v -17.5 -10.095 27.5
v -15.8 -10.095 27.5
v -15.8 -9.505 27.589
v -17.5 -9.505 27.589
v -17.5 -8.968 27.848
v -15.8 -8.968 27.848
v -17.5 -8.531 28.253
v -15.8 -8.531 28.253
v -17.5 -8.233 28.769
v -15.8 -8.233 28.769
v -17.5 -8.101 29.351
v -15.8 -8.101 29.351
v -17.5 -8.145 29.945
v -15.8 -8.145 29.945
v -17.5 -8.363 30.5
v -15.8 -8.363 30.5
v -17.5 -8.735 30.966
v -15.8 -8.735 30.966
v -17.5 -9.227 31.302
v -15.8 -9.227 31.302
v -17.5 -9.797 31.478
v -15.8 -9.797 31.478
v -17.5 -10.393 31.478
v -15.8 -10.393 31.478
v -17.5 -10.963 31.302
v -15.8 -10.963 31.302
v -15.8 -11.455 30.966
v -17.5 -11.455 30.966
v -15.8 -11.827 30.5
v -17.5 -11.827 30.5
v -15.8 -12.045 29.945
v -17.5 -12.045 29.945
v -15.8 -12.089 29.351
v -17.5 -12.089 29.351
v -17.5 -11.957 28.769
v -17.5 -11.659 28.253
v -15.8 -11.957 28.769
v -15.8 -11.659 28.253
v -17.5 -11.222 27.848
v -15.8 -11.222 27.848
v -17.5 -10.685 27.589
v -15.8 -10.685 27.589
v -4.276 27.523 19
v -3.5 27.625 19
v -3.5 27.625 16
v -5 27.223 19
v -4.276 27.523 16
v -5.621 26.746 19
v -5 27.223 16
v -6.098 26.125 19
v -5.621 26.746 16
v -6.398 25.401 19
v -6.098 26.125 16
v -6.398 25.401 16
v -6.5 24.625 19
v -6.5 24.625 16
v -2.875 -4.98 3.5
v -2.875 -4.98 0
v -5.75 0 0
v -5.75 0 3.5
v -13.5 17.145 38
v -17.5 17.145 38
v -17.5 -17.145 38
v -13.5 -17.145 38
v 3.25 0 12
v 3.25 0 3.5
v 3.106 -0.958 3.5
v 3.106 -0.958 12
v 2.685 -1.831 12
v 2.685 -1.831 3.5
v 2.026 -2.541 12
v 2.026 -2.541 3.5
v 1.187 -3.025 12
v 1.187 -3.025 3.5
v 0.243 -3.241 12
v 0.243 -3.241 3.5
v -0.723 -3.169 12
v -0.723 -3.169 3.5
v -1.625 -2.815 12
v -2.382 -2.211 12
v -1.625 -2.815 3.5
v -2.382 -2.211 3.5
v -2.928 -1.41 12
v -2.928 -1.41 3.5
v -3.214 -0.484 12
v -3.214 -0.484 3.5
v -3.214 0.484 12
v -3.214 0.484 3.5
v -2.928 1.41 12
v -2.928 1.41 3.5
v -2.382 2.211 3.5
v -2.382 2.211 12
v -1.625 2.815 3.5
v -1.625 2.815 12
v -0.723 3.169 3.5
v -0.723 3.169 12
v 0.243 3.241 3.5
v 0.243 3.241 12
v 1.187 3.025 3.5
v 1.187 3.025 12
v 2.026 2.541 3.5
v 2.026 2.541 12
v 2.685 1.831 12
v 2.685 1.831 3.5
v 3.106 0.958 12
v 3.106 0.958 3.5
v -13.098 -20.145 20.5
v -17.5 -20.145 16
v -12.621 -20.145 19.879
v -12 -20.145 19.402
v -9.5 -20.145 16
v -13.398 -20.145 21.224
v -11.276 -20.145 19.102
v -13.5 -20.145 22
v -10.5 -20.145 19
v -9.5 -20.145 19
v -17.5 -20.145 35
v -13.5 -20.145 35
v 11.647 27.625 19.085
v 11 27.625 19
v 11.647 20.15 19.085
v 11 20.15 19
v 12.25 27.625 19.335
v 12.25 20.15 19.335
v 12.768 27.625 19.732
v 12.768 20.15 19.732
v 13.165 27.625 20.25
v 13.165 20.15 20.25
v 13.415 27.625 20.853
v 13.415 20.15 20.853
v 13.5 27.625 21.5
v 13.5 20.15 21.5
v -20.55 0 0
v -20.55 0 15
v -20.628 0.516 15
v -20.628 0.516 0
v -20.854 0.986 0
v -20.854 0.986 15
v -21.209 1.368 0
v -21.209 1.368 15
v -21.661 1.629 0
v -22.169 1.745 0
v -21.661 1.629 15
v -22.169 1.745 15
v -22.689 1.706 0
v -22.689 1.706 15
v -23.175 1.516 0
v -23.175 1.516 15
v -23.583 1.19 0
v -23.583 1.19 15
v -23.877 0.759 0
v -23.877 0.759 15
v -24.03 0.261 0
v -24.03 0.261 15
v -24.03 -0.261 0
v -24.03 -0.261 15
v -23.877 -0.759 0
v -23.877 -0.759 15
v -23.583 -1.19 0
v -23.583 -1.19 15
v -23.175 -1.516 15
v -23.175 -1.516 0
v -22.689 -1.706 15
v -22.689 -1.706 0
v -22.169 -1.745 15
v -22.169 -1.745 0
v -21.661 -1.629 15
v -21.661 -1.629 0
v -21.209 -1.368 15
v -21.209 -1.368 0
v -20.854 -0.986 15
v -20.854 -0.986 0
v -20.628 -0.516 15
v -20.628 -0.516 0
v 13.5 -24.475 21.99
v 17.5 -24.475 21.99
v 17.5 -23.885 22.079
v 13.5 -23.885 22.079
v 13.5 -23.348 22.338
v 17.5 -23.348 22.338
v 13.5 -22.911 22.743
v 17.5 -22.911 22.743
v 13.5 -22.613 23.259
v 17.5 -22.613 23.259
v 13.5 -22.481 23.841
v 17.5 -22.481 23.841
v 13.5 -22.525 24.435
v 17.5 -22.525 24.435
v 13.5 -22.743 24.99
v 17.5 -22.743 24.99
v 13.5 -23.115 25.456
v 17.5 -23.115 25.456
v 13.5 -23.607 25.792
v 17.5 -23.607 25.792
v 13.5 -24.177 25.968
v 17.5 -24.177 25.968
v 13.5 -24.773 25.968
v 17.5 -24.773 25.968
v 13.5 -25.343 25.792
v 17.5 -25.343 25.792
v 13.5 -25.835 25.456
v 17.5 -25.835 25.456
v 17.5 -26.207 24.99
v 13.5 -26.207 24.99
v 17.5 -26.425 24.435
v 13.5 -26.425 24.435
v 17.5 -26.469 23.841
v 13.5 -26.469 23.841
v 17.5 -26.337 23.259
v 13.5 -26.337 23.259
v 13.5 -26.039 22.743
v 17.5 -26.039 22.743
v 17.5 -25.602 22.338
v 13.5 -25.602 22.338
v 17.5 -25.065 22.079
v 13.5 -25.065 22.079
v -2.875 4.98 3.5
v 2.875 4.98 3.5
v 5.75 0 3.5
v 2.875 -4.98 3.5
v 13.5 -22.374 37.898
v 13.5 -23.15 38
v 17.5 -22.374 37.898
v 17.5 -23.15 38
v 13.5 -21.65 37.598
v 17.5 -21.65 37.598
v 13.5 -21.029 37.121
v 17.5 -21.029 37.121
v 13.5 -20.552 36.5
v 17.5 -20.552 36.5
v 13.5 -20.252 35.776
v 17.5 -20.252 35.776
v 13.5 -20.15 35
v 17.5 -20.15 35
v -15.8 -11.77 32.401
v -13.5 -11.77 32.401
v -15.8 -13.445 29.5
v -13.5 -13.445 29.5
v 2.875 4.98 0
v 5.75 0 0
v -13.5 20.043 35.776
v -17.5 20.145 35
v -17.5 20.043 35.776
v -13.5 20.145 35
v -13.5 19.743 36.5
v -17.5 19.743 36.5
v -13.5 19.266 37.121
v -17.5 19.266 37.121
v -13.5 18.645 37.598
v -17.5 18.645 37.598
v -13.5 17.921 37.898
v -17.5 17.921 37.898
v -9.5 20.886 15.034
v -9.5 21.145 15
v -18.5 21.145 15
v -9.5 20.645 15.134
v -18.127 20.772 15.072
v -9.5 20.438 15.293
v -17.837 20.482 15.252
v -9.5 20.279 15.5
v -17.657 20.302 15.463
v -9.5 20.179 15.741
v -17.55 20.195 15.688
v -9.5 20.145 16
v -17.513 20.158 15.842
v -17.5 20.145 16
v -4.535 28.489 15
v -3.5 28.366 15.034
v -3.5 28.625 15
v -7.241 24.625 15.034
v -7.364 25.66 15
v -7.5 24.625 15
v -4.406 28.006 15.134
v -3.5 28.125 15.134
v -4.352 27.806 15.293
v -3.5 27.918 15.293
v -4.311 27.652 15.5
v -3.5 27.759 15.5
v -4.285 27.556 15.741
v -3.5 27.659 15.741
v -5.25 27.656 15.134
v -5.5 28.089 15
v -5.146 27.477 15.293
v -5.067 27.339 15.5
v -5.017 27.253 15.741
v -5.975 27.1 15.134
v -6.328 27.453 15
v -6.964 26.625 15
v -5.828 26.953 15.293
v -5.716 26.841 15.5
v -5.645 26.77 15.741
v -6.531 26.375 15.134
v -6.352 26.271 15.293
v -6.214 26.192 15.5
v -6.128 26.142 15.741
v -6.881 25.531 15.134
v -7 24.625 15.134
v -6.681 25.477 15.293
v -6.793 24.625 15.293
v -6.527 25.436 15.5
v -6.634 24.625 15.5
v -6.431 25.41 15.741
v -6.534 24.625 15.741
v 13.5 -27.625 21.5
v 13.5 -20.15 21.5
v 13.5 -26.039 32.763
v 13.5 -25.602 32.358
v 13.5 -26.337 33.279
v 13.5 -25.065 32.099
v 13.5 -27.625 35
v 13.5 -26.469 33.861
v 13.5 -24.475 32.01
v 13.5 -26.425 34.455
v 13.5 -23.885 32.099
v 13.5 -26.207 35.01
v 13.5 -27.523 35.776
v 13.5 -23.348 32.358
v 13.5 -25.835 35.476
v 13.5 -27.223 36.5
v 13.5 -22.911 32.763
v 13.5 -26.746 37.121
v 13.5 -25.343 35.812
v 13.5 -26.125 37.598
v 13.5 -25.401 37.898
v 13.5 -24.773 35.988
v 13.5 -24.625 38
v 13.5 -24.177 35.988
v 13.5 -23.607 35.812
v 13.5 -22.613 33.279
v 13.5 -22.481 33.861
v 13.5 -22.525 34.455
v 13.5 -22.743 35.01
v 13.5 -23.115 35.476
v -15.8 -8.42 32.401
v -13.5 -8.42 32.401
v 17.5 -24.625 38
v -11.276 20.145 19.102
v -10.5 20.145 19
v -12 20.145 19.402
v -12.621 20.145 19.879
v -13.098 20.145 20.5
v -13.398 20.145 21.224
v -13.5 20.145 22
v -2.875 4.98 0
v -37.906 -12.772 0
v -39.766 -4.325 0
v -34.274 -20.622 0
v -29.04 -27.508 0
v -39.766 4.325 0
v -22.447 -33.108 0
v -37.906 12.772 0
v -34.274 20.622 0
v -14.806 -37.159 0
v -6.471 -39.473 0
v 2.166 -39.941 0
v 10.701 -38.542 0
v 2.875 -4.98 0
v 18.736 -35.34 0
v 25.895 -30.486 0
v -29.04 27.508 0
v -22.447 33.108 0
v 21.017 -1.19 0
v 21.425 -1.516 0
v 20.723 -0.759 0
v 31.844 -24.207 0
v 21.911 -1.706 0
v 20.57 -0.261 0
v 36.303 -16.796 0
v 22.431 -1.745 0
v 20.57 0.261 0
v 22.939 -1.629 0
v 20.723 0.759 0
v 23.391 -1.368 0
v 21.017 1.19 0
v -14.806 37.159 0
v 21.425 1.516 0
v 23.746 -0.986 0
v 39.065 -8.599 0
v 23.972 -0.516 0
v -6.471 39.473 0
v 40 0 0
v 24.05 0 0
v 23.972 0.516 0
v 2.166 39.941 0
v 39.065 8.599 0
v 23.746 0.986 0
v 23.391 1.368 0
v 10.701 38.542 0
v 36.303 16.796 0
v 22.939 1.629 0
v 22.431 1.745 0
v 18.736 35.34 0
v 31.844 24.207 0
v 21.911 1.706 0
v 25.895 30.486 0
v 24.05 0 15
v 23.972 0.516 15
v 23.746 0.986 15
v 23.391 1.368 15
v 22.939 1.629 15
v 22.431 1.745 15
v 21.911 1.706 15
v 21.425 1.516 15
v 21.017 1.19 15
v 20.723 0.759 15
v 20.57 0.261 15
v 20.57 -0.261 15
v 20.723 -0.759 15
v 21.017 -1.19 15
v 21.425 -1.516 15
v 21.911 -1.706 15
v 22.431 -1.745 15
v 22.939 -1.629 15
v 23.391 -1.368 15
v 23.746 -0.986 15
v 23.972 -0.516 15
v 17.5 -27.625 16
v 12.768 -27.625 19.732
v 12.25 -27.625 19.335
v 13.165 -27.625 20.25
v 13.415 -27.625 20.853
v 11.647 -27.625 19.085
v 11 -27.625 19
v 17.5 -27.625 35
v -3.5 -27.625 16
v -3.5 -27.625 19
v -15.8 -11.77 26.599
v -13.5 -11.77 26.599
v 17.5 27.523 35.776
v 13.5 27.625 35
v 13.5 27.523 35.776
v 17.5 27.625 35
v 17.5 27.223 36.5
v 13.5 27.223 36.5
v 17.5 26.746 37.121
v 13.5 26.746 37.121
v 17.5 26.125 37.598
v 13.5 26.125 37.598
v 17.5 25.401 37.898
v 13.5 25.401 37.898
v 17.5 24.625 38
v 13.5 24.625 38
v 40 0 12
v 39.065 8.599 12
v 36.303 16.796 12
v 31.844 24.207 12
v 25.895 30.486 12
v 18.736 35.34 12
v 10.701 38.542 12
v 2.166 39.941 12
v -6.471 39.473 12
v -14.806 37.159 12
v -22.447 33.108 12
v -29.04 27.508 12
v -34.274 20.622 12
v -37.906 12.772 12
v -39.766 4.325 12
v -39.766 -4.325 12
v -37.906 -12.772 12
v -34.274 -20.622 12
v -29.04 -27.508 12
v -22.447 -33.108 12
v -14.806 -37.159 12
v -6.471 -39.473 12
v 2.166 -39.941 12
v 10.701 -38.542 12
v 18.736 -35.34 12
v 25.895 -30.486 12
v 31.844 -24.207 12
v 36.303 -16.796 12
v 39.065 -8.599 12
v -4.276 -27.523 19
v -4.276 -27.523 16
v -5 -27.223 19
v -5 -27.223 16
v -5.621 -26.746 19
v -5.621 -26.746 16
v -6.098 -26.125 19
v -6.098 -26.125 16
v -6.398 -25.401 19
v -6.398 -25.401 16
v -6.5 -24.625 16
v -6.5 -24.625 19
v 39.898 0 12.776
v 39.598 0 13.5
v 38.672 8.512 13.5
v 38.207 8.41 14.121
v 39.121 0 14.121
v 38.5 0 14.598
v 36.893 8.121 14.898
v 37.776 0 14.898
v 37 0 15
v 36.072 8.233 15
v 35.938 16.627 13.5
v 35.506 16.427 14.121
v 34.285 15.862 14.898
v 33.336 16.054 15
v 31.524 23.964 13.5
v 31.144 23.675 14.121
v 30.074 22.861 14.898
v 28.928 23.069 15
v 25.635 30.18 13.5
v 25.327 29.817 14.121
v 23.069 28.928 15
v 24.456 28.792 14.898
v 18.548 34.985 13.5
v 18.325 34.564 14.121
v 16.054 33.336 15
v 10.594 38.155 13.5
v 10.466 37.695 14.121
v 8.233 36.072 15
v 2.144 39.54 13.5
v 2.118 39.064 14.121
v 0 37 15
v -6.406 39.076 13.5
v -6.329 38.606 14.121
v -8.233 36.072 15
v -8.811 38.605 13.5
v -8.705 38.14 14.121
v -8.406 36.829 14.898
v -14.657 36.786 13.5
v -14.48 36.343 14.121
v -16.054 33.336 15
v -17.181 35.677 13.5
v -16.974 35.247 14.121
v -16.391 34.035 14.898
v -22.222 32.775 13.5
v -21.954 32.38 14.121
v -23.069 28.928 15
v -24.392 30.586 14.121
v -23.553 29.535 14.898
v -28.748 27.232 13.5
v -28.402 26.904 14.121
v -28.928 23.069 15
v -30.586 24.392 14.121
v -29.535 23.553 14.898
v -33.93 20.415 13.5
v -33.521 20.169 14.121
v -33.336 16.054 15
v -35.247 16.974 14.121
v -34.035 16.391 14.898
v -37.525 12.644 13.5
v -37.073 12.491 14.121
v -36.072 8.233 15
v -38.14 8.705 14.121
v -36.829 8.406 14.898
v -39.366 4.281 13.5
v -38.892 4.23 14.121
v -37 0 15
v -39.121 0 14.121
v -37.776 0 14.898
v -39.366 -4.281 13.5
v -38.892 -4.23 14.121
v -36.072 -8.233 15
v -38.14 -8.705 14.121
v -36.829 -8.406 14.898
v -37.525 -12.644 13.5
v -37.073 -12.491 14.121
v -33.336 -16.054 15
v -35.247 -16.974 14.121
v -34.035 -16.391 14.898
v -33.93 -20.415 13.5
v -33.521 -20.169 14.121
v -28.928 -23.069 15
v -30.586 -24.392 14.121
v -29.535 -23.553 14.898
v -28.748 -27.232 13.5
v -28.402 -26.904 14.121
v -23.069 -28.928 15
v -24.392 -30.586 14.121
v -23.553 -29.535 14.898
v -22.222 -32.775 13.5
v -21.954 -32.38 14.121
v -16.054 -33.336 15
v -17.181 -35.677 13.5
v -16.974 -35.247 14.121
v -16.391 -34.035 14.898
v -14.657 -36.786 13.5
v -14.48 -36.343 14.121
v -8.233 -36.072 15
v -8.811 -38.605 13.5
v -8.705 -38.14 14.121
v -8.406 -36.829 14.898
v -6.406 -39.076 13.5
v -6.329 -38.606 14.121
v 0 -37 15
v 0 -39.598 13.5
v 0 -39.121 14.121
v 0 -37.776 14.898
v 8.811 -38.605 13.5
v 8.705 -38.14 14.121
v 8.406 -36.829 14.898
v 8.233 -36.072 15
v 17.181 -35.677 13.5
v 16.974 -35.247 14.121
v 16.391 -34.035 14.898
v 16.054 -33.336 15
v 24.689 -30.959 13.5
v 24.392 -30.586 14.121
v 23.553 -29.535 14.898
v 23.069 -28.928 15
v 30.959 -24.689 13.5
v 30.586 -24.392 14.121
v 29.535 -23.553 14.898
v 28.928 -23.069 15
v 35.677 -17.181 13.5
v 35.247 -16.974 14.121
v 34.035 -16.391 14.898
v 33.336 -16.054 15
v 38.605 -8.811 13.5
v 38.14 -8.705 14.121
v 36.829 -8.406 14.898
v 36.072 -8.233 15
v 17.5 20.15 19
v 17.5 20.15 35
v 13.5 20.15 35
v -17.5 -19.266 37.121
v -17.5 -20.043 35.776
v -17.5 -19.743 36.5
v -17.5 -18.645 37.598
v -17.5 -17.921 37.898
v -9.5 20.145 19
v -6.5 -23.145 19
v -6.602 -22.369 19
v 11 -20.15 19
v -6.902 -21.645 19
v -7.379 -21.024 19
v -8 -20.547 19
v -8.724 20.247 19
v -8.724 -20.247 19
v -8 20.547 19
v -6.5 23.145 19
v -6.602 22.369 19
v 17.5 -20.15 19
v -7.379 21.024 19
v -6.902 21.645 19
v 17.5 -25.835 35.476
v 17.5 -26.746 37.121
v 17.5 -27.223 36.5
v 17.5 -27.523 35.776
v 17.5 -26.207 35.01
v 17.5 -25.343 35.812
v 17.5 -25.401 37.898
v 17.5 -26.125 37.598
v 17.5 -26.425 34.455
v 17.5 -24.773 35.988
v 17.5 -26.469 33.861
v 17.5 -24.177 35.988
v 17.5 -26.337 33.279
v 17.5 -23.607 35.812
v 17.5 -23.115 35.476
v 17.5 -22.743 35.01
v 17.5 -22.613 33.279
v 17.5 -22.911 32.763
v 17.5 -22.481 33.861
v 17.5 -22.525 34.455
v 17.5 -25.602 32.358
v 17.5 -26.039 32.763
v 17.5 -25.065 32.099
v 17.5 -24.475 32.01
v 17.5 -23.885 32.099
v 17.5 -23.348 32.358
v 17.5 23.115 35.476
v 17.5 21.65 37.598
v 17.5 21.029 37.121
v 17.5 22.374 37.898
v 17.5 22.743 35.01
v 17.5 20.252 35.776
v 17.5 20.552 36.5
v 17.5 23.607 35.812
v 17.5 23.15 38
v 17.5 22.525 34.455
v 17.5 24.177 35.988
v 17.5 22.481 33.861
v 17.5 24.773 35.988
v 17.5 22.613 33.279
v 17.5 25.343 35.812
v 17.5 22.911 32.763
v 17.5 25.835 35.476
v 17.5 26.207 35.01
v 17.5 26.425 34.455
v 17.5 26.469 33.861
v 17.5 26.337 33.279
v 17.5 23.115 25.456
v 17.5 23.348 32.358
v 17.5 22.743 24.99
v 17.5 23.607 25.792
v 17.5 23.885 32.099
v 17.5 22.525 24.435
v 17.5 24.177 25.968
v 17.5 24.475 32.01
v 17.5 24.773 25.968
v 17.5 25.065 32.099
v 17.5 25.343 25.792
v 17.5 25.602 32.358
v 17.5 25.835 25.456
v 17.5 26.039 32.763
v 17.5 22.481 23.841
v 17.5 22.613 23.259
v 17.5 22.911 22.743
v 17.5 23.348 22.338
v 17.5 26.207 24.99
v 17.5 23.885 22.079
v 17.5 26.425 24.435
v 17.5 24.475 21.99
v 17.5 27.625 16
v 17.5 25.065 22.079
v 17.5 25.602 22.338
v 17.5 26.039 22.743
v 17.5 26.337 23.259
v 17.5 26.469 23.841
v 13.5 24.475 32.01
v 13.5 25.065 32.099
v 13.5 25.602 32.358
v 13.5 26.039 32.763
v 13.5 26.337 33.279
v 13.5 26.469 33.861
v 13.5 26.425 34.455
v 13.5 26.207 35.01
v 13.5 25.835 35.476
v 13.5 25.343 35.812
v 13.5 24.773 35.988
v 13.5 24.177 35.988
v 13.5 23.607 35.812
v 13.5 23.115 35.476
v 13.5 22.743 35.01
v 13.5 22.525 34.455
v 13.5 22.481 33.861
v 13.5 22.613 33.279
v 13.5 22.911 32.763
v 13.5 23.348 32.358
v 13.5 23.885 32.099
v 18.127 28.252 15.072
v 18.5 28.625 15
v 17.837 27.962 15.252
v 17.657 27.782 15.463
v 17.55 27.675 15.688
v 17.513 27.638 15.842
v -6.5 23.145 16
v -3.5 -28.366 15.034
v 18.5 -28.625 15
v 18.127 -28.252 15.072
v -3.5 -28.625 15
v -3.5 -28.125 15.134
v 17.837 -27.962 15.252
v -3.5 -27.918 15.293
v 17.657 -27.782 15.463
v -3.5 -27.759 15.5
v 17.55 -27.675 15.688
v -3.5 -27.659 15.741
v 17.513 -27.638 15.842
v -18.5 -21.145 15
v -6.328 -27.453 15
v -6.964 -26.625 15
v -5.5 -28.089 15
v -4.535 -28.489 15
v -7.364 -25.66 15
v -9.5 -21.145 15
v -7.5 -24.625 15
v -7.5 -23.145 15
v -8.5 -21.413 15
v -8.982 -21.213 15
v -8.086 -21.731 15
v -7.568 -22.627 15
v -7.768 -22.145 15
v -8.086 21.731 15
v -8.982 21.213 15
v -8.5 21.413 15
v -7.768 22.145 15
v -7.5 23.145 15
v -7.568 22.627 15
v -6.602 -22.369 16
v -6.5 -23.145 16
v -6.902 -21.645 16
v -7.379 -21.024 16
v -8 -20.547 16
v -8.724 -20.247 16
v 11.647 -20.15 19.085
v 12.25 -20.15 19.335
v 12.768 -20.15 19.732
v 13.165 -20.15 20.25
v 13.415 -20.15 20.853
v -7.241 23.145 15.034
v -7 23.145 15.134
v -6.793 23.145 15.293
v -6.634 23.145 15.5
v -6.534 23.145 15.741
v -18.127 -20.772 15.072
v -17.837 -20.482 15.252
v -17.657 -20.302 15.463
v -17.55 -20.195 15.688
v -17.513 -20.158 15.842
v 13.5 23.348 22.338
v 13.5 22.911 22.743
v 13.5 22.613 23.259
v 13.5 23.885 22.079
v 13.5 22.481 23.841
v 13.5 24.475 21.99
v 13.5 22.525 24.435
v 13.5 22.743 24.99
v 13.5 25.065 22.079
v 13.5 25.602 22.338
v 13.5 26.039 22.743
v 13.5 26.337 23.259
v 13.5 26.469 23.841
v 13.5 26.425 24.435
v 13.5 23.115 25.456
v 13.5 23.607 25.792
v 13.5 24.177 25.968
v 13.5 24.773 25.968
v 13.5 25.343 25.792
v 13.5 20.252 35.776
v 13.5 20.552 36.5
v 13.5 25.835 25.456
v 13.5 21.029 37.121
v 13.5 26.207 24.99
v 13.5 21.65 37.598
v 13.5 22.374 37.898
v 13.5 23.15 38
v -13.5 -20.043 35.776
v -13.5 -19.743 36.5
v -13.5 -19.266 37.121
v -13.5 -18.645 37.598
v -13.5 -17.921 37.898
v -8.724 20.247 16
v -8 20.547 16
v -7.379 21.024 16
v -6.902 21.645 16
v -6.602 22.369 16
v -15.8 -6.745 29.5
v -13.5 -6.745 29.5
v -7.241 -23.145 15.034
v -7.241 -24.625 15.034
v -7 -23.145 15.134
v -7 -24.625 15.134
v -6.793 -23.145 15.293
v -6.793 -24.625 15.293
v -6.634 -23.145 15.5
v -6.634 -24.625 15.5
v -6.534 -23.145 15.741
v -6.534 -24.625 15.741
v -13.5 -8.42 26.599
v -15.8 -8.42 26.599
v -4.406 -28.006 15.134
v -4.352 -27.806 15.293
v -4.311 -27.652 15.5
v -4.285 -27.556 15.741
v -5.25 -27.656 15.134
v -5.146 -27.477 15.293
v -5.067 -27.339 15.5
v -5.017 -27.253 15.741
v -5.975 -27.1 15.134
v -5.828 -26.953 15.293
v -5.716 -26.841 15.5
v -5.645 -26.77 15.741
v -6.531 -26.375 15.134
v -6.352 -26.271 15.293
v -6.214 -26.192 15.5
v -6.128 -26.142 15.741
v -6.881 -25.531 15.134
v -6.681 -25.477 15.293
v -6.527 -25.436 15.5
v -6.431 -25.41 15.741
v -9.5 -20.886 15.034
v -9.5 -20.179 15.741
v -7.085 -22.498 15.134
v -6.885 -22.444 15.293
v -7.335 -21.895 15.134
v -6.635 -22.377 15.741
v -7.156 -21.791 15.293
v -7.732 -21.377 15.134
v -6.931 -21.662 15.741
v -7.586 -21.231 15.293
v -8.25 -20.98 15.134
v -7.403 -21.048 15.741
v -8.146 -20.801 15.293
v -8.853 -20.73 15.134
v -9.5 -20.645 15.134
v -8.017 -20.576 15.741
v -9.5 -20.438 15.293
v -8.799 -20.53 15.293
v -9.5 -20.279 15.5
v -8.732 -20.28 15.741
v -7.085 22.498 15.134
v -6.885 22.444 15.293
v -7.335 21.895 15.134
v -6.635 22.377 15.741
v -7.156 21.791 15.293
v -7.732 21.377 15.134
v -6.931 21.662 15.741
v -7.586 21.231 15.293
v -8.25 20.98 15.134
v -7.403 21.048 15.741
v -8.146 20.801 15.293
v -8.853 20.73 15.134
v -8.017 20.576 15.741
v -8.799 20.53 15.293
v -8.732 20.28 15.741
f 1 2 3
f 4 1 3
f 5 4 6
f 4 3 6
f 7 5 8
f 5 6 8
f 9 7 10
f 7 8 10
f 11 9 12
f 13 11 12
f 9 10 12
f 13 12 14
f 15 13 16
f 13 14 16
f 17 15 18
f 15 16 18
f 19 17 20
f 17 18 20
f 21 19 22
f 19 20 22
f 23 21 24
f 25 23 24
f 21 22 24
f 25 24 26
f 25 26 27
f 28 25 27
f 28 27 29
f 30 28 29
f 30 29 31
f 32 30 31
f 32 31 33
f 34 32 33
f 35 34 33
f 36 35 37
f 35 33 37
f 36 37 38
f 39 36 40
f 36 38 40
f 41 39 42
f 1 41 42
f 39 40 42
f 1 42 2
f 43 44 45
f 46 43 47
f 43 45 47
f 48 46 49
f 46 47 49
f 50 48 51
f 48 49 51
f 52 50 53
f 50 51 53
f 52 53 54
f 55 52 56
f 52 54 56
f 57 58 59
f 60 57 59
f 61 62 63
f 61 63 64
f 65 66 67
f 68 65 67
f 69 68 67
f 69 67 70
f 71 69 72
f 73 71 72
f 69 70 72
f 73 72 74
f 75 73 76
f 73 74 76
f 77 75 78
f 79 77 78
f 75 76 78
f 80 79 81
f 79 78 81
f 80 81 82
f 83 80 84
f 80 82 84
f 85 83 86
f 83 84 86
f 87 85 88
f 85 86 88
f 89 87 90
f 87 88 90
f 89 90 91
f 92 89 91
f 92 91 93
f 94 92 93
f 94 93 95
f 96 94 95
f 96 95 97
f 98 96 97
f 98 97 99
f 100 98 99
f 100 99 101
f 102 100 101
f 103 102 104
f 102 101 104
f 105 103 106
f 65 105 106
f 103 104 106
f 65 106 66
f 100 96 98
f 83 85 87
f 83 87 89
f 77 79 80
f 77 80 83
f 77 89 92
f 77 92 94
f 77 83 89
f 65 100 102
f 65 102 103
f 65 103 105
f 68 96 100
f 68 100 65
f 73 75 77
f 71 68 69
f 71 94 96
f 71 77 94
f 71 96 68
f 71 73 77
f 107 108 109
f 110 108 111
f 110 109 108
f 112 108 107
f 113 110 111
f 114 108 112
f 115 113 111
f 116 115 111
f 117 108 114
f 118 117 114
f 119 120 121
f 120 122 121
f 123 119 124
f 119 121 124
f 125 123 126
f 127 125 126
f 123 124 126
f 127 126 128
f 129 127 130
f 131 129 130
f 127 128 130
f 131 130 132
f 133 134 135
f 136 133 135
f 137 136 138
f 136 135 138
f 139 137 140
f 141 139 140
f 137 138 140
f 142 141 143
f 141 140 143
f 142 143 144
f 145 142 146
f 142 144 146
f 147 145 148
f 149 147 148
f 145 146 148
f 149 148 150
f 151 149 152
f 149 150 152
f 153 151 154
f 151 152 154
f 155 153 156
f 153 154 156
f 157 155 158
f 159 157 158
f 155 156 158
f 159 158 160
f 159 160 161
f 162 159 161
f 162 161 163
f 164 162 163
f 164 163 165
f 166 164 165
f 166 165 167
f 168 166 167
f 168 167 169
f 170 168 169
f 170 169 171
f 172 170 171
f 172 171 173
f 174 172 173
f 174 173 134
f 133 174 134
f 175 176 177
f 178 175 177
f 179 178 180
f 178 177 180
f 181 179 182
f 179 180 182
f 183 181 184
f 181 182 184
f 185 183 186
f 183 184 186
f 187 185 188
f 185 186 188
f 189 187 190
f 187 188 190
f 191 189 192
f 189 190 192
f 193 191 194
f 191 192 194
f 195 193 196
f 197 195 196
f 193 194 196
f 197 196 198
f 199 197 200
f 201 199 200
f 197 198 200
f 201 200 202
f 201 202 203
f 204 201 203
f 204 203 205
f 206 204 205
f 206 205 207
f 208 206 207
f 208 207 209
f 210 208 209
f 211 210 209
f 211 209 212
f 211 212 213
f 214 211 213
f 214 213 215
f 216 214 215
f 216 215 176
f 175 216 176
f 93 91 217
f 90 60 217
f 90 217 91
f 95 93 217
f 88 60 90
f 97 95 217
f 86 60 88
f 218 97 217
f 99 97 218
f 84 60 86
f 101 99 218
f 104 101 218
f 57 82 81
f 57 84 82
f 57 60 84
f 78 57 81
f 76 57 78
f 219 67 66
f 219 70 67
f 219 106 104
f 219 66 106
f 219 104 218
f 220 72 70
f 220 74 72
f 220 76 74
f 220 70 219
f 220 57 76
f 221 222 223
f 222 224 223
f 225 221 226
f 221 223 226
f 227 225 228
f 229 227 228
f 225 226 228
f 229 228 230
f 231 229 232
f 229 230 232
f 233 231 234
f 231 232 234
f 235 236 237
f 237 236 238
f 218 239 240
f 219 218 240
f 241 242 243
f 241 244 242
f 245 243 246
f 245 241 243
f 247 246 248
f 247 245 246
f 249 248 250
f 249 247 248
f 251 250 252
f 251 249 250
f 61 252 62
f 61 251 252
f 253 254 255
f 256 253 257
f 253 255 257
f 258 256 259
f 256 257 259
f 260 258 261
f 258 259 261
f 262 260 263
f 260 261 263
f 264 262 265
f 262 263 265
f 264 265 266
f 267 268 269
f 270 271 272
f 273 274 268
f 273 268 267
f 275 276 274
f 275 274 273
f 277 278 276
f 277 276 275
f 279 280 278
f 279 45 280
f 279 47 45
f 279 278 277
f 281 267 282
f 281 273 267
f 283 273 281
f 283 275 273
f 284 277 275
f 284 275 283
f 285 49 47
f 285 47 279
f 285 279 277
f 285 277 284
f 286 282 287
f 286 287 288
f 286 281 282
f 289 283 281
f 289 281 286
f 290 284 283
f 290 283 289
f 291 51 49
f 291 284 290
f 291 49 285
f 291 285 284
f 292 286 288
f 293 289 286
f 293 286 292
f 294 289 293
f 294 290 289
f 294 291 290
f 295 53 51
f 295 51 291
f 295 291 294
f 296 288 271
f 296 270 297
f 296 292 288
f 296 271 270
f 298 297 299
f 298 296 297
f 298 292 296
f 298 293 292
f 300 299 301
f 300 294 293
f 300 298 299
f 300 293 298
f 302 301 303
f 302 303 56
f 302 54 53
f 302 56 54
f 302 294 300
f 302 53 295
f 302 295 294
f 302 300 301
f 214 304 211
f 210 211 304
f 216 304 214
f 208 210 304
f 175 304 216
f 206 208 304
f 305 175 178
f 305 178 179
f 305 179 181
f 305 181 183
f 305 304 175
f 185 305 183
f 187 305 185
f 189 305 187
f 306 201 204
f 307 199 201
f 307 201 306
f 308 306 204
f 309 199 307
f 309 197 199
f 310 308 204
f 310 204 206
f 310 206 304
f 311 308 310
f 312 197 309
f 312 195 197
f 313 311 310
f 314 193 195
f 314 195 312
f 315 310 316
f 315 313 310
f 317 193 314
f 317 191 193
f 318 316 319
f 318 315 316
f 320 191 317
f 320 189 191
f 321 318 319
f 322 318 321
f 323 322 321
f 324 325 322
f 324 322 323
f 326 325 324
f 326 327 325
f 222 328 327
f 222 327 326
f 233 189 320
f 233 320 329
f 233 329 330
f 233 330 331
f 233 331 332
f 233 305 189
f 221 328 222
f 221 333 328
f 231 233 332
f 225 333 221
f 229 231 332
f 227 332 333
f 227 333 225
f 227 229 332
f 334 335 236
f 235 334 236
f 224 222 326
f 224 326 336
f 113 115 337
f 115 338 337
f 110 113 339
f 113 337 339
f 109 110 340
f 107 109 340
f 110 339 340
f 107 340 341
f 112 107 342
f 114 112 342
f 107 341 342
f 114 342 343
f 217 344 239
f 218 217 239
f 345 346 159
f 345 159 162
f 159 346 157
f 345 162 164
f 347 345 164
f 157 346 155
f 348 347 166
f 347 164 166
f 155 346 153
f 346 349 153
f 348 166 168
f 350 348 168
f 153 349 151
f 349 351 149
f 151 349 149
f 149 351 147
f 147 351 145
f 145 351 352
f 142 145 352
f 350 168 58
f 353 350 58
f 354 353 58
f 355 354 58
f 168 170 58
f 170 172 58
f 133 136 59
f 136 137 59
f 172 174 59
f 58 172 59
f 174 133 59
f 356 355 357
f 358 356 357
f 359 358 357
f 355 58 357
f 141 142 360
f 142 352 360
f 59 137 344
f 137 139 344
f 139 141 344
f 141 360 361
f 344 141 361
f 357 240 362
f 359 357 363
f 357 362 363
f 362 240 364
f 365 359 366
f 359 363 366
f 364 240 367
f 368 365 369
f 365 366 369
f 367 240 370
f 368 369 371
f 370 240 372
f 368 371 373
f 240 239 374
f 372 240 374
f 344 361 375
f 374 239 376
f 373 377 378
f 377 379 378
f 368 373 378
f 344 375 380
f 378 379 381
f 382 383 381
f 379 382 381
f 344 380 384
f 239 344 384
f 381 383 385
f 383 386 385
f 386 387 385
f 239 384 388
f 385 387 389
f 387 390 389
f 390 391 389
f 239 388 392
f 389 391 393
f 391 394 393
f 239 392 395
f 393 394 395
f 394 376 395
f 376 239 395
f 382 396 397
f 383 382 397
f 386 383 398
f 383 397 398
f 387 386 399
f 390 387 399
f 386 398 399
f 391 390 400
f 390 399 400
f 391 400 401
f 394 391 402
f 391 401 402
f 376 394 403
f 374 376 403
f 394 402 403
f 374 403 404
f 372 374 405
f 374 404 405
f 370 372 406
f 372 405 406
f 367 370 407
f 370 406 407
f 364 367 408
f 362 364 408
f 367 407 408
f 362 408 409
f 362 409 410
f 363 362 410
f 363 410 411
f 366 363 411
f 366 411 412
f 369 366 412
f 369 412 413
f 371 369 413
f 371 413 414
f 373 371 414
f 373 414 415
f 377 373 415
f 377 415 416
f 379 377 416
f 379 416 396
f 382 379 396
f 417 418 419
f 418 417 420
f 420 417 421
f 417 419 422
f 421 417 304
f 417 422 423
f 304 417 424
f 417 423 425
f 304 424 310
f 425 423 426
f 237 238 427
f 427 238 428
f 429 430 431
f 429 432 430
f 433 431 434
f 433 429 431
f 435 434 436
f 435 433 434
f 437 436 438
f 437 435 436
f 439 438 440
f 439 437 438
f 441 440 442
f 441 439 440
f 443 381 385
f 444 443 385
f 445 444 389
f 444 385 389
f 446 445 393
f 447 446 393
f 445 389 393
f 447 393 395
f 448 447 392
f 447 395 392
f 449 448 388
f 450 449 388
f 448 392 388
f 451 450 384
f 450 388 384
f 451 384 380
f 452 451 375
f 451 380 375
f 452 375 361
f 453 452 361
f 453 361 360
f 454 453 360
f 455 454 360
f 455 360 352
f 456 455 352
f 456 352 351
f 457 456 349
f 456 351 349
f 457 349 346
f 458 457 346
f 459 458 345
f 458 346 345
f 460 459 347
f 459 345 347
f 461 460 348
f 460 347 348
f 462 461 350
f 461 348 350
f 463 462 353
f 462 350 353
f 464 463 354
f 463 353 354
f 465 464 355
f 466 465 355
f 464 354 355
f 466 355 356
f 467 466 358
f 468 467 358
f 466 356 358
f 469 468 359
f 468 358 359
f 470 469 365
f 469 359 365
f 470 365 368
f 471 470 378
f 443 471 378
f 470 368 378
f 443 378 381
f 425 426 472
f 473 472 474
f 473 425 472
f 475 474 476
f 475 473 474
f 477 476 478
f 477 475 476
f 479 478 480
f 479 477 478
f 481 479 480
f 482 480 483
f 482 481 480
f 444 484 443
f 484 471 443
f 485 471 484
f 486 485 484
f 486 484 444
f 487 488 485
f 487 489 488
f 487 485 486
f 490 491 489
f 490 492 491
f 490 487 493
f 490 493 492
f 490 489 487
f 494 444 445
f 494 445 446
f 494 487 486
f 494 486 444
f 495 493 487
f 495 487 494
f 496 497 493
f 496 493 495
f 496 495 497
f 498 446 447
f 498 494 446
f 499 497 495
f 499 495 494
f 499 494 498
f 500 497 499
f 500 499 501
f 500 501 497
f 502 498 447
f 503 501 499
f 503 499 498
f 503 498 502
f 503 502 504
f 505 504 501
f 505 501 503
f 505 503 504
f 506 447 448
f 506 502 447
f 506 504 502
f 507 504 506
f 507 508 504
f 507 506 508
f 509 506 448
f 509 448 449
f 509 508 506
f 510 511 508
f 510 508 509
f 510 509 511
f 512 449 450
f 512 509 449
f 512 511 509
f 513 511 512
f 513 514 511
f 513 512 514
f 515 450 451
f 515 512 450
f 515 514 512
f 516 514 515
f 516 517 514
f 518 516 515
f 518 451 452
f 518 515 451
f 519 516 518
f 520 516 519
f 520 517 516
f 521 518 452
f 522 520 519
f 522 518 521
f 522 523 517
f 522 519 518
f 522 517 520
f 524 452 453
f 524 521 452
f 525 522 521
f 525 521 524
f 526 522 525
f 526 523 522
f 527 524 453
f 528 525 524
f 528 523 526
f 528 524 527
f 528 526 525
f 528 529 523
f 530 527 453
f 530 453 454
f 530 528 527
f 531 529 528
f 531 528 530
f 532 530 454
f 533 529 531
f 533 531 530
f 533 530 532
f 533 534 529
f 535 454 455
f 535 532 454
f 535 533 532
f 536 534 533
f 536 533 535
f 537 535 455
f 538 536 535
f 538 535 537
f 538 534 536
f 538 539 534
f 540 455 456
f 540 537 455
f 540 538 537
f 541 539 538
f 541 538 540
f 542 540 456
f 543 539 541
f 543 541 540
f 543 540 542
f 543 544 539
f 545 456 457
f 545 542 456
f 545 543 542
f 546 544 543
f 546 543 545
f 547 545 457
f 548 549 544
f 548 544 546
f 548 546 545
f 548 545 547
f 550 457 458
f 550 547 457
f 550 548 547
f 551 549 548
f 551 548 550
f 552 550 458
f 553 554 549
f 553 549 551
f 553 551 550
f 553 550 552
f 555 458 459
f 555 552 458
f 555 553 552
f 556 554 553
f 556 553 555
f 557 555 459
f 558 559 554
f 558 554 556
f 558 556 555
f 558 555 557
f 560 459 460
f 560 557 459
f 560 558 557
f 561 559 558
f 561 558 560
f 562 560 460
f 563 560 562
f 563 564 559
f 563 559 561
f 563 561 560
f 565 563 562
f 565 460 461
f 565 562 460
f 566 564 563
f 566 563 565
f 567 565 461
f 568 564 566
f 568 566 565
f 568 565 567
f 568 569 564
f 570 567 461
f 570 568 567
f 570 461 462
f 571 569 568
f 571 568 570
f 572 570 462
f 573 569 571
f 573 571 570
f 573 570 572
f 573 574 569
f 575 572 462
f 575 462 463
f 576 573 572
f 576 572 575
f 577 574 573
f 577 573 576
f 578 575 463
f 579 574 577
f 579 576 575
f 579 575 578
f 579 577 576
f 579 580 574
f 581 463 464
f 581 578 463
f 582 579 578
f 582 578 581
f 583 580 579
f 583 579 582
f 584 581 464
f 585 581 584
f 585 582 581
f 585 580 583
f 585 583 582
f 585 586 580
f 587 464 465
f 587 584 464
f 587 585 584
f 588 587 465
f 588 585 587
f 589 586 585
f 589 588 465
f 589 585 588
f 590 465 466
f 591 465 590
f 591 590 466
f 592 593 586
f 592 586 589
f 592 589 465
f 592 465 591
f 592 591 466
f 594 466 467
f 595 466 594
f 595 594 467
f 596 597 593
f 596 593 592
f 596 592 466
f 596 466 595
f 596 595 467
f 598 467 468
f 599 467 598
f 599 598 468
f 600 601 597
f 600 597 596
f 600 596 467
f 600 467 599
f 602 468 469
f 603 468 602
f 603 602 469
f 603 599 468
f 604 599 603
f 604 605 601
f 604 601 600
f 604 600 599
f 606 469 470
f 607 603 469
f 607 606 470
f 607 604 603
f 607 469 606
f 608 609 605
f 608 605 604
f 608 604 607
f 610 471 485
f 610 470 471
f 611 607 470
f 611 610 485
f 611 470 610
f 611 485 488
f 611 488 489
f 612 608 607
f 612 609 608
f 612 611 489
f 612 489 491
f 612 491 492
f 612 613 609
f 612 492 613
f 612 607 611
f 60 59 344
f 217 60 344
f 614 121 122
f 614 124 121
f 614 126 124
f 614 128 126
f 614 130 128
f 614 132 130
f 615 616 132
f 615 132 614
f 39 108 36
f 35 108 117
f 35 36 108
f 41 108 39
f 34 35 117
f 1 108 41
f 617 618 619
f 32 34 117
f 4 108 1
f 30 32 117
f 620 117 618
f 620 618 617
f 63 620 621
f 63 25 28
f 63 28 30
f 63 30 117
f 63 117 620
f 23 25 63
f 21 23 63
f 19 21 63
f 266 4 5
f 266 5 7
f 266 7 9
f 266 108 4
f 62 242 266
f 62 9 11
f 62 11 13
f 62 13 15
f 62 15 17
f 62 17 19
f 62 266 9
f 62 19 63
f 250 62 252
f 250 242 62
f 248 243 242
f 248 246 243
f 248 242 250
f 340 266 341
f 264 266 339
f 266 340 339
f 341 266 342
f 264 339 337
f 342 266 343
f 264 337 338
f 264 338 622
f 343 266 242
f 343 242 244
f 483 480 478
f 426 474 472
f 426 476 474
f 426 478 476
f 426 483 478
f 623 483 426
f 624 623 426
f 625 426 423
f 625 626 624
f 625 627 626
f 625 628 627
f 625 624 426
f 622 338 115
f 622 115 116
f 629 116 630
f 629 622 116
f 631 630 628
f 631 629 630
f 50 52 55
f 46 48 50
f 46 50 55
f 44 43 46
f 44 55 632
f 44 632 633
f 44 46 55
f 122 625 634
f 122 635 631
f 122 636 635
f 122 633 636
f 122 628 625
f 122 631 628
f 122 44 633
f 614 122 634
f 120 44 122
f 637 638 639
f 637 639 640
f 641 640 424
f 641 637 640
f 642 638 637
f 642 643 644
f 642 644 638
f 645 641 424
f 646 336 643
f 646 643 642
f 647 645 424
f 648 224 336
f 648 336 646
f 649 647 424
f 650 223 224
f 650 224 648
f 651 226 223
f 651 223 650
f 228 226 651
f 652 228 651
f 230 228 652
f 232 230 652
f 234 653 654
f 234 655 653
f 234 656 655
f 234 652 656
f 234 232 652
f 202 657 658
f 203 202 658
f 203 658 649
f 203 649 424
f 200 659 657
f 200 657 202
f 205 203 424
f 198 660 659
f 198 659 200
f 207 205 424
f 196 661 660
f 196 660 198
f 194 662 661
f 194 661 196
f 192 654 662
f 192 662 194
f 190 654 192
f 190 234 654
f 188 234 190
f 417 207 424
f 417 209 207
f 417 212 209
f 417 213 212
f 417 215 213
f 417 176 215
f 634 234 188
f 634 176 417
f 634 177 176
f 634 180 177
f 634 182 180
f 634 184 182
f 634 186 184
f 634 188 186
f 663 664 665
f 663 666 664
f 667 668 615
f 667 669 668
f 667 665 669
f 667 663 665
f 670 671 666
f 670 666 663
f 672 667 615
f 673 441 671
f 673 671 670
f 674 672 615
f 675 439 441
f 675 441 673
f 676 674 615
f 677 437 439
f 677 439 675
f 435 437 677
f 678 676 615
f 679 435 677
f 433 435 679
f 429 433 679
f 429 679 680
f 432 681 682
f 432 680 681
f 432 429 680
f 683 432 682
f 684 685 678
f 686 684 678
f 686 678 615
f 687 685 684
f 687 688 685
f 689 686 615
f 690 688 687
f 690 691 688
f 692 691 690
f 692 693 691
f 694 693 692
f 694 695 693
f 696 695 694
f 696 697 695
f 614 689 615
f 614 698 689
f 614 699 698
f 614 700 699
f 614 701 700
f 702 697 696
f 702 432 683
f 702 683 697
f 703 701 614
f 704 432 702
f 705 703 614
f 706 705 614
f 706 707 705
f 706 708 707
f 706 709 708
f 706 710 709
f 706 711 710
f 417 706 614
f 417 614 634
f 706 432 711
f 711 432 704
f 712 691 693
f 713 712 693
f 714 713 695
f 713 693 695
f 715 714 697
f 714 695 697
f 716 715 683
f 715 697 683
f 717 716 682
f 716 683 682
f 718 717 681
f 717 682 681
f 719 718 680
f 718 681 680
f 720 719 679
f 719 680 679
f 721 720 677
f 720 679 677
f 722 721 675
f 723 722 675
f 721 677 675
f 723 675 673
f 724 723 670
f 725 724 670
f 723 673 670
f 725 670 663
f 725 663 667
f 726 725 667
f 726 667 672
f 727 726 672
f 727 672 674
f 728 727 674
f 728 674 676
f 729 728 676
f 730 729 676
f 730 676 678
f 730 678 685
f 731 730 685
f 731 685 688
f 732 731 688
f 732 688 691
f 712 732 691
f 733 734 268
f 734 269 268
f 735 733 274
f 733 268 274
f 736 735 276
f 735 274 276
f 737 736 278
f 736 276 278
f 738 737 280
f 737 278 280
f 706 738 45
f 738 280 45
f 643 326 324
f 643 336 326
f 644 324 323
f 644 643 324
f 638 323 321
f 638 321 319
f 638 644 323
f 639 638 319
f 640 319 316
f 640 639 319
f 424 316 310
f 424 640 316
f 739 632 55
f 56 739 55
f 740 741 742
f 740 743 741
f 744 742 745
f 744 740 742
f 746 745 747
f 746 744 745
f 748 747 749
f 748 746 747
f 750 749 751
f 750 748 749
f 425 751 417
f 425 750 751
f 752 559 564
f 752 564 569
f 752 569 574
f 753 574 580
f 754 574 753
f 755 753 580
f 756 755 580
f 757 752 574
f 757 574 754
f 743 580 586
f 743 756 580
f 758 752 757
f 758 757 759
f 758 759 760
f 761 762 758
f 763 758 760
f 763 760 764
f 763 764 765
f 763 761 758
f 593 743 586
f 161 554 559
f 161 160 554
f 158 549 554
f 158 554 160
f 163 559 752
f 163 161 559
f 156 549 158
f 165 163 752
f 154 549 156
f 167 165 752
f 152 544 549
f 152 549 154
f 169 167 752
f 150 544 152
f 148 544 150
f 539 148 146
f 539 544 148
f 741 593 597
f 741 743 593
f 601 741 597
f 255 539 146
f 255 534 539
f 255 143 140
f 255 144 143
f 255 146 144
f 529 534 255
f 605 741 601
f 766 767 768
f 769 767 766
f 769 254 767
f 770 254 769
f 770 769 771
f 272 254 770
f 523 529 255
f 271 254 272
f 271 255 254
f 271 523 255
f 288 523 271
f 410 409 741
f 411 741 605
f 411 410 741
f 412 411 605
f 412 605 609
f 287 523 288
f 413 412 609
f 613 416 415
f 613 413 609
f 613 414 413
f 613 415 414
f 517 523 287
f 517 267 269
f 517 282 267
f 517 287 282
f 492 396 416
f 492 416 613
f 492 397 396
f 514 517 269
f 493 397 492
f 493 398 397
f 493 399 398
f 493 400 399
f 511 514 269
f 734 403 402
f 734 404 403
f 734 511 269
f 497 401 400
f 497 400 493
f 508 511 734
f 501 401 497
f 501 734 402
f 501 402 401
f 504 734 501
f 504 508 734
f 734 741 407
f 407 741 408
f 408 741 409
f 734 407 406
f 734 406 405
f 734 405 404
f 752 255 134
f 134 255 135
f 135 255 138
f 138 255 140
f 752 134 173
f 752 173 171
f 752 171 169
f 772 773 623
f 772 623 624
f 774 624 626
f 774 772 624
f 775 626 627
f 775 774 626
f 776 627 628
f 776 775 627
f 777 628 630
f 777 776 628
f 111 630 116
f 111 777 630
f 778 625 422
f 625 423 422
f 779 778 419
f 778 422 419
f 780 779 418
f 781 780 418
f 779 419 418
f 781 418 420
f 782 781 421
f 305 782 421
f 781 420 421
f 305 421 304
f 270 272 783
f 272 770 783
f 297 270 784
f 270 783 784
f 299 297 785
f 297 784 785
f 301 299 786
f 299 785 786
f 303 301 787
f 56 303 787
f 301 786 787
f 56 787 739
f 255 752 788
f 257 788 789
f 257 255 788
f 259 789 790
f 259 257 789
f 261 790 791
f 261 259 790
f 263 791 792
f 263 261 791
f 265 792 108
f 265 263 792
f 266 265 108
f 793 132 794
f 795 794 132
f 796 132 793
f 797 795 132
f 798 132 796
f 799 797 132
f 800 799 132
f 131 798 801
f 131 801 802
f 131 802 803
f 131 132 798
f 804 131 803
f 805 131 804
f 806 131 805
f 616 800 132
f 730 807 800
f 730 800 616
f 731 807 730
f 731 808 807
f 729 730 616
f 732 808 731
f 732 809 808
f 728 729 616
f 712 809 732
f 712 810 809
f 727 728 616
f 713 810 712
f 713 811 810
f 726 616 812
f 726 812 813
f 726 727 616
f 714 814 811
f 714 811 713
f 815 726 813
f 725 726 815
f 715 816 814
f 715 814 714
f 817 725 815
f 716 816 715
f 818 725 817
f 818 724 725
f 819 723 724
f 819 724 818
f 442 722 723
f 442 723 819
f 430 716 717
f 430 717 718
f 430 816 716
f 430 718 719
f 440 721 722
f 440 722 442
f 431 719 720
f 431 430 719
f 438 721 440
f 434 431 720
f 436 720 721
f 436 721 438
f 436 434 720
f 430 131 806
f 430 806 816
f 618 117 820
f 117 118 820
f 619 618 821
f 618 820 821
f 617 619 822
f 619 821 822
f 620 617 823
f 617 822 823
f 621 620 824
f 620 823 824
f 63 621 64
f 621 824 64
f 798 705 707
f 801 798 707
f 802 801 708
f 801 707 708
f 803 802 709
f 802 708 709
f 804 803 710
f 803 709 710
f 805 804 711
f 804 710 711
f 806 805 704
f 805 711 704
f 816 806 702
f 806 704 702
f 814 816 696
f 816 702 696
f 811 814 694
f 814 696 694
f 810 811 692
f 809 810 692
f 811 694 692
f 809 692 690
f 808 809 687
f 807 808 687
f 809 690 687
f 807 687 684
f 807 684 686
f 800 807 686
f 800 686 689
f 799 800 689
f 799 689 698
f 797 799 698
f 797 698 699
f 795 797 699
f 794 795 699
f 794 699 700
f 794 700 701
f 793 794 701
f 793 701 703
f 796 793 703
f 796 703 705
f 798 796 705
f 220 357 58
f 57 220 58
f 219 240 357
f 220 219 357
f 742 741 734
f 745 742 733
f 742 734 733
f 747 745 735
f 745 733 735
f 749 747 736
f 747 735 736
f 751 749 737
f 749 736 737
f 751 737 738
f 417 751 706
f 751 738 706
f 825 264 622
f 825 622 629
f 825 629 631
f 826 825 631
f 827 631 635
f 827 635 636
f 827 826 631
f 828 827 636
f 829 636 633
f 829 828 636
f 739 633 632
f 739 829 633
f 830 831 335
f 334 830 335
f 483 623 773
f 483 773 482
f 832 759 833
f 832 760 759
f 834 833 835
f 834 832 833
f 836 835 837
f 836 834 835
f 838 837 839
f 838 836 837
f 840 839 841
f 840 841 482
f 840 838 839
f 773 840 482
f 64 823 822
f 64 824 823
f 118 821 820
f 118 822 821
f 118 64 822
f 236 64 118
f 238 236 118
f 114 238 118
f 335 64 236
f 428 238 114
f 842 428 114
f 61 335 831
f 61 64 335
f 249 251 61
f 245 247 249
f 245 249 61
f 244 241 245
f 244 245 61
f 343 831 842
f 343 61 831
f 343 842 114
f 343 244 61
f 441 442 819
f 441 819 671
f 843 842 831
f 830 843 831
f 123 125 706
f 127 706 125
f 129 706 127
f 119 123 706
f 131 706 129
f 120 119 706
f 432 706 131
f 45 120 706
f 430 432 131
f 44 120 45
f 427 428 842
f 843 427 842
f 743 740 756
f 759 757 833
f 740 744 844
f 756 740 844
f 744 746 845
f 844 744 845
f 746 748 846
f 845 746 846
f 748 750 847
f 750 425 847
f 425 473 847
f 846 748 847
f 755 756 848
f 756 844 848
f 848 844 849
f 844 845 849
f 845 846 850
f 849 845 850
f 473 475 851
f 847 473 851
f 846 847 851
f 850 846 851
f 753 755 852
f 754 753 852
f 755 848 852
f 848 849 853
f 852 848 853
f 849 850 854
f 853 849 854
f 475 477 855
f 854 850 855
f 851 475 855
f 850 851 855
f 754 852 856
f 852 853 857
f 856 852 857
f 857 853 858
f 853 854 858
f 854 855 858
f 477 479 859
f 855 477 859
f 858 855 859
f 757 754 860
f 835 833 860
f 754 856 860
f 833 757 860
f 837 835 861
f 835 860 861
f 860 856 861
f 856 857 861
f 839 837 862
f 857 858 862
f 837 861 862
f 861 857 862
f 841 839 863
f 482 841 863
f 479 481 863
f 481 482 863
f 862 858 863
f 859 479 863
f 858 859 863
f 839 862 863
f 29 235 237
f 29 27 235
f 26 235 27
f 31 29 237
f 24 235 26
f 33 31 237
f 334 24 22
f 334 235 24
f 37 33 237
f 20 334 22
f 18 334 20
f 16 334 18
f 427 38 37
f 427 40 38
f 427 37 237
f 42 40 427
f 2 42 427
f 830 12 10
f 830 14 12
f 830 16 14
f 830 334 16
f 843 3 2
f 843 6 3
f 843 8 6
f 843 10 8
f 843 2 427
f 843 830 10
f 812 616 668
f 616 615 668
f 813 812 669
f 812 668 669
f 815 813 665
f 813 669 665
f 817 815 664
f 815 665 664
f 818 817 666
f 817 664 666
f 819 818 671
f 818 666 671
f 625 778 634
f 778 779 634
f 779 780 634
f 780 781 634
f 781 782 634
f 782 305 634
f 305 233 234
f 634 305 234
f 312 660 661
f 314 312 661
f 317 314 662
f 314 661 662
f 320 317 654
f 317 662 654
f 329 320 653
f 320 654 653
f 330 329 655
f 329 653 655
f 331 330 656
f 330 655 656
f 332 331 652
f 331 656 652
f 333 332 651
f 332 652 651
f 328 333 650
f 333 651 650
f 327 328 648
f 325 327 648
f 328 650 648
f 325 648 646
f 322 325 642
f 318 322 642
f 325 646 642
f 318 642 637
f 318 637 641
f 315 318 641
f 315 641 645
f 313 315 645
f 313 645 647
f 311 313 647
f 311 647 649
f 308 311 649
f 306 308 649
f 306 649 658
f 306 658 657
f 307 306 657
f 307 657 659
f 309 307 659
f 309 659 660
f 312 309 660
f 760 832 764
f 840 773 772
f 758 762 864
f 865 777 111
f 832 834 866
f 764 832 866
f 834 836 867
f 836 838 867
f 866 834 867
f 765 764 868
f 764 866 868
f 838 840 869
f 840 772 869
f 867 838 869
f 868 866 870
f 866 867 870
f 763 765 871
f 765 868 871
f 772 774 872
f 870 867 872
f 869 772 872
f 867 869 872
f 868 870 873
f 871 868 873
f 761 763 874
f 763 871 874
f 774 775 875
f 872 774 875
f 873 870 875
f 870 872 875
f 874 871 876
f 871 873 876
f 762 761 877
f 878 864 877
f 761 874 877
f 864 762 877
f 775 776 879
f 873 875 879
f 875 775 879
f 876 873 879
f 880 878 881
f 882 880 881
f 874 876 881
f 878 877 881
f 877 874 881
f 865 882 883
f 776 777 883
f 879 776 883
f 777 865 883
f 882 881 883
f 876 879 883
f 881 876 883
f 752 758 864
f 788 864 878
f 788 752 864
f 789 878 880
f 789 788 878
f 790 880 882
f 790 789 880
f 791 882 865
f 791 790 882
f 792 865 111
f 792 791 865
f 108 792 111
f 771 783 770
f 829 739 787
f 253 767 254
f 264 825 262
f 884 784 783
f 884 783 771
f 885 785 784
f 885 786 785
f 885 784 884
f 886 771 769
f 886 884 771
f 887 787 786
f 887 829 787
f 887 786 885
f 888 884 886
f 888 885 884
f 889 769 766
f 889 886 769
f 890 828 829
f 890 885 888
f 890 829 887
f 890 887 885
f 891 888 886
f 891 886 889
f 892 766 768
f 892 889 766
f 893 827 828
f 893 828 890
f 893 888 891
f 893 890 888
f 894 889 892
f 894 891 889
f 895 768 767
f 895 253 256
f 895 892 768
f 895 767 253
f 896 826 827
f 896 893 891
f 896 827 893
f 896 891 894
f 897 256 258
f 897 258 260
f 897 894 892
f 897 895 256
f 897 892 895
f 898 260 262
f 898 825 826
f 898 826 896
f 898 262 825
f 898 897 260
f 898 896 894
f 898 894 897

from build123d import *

# Parameters (mm, degrees)
PAD001_DEPTH            = 27.625
SKETCH006_W             = 4
SKETCH006_H             = 40.3
POCKET003_DEPTH         = 19
SKETCH007_W             = 11
SKETCH007_H             = 7.48
POCKET004_DEPTH         = 161.659754
SKETCH008_R             = 2
POCKET005_DEPTH         = 5
POCKET006_DEPTH         = 2.3
SKETCH010_R             = 2
POCKET007_DEPTH         = 1.7
FILLET001_R             = 3
FILLET002_R             = 2.5
BODY001_PLACEMENT_ANGLE = 90
SKETCH_R                = 40
PAD_DEPTH               = 15
POCKET_DEPTH            = 3.5
SKETCH002_R             = 3.25
POCKET001_DEPTH         = 8.5
SKETCH003_R             = 1.75
POCKET002_DEPTH         = 15.001
FILLET_R                = 3
FILLET003_R             = 1


with BuildPart() as body001:
    # Sketch005 → Pad001 (new body, symmetric)
    with BuildSketch(Plane.YZ):
        Polygon((-17.5, 23), (-17.5, 0), (17.5, 0), (17.5, 23), (13.5, 23), (13.5, 4), (-13.5, 4), (-13.5, 23), align=None)
    extrude(amount=PAD001_DEPTH, both=True)

    # Sketch006 (on Face8 of Pad001) → Pocket003 (cut)
    with BuildSketch(Plane(origin=(0, 0, 23), x_dir=(0, -1, 0), z_dir=(0, 0, 1))):
        with Locations((15.5, 0)):
            Rectangle(SKETCH006_W, SKETCH006_H)
    extrude(amount=-POCKET003_DEPTH, mode=Mode.SUBTRACT)

    # Sketch007 (on Face11 of Pocket003) → Pocket004 (cut, through all)
    with BuildSketch(Plane(origin=(0, 0, 23), x_dir=(0, -1, 0), z_dir=(0, 0, 1))):
        with Locations((-12, 23.885)):
            Rectangle(SKETCH007_W, SKETCH007_H)
    pocket004 = extrude(amount=-POCKET004_DEPTH, mode=Mode.SUBTRACT)

    # Mirrored: Pocket004 across YZ
    add(pocket004.mirror(Plane.YZ), mode=Mode.SUBTRACT)

    # Sketch008 (on Face1 of Mirrored) → Pocket005 (cut)
    with BuildSketch(Plane(origin=(0, -17.5, 0), x_dir=(0, 0, -1), z_dir=(0, -1, 0))):
        with Locations((-19.01, -24.475)):
            Circle(SKETCH008_R)
        with Locations((-8.99, -24.475)):
            Circle(SKETCH008_R)
        with Locations((-8.99, 24.475)):
            Circle(SKETCH008_R)
        with Locations((-19.01, 24.475)):
            Circle(SKETCH008_R)
    extrude(amount=-POCKET005_DEPTH, mode=Mode.SUBTRACT)

    # Sketch009 (on Face22 of Pocket005) → Pocket006 (cut)
    with BuildSketch(Plane(origin=(0, 13.5, 0), x_dir=(0, 0, -1), z_dir=(0, -1, 0))):
        Polygon((-11.598815, -11.77), (-11.598815, -8.42), (-14.5, -6.745), (-17.401185, -8.42), (-17.401185, -11.77), (-14.5, -13.445), align=None)
    extrude(amount=-POCKET006_DEPTH, mode=Mode.SUBTRACT)

    # Sketch010 (on Face30 of Pocket006) → Pocket007 (cut)
    with BuildSketch(Plane(origin=(0, 15.8, 0), x_dir=(0, 0, -1), z_dir=(0, -1, 0))):
        with Locations((-14.5, -10.095)):
            Circle(SKETCH010_R)
    extrude(amount=-POCKET007_DEPTH, mode=Mode.SUBTRACT)

    # Fillet001
    fillet001_edges = [body001.edges().sort_by_distance(p)[0] for p in [
        (-20.15, -15.5, 23),
        (-27.625, -15.5, 23),
        (20.15, -15.5, 23),
        (27.625, -15.5, 23),
        (20.145, 15.5, 23),
        (27.625, 6.5, 2),
        (-20.145, 15.5, 23),
        (-27.625, 6.5, 2),
        (-20.145, 6.5, 2),
        (20.145, 6.5, 2),
        (0, 13.5, 4),
    ]]
    fillet(fillet001_edges, radius=FILLET001_R)

    # Fillet002
    fillet002_edges = [body001.edges().sort_by_distance(p)[0] for p in [
        (-23.8875, -13.5, 4),
        (23.8875, -13.5, 4),
    ]]
    fillet(fillet002_edges, radius=FILLET002_R)


with BuildPart() as body001_1:
    # Body001 placement: moved
    add(body001.part.moved(Location((0, 0, 15))).rotate(Axis((0, 0, 15), (0, 0, 1)), BODY001_PLACEMENT_ANGLE))


with BuildPart() as body:
    # Sketch → Pad (new body)
    with BuildSketch(Plane.XY):
        Circle(SKETCH_R)
    extrude(amount=PAD_DEPTH)

    # Sketch001 (on Face2 of Pad) → Pocket (cut)
    with BuildSketch(Plane(origin=(0, 0, 0), x_dir=(1, 0, 0), z_dir=(0, 0, -1))):
        Polygon((2.875, -4.979646), (5.75, 0), (2.875, 4.979646), (-2.875, 4.979646), (-5.75, 0), (-2.875, -4.979646), align=None)
    extrude(amount=-POCKET_DEPTH, mode=Mode.SUBTRACT)

    # Sketch002 (on Face10 of Pocket) → Pocket001 (cut)
    with BuildSketch(Plane(origin=(0, 0, 3.5), x_dir=(1, 0, 0), z_dir=(0, 0, -1))):
        Circle(SKETCH002_R)
    extrude(amount=-POCKET001_DEPTH, mode=Mode.SUBTRACT)

    # Sketch003 (on Face3 of Pocket001) → Pocket002 (cut, through all)
    with BuildSketch(Plane.XY.offset(15)):
        with Locations((22.3, 0)):
            Circle(SKETCH003_R)
        with Locations((-22.3, 0)):
            Circle(SKETCH003_R)
    extrude(amount=-POCKET002_DEPTH, mode=Mode.SUBTRACT)

    # Fillet
    fillet_edges = [body.edges().sort_by_distance(p)[0] for p in [
        (-40, 0, 15),
    ]]
    fillet(fillet_edges, radius=FILLET_R)

    # Boolean: union Body001
    add(body001_1.part)

    # Fillet003
    fillet003_edges = [body.edges().sort_by_distance(p)[0] for p in [
        (17.5, 0, 15),
        (7, 27.625, 15),
        (7, -27.625, 15),
        (-17.5, 0, 15),
    ]]
    fillet(fillet003_edges, radius=FILLET003_R)


solid = body.part
